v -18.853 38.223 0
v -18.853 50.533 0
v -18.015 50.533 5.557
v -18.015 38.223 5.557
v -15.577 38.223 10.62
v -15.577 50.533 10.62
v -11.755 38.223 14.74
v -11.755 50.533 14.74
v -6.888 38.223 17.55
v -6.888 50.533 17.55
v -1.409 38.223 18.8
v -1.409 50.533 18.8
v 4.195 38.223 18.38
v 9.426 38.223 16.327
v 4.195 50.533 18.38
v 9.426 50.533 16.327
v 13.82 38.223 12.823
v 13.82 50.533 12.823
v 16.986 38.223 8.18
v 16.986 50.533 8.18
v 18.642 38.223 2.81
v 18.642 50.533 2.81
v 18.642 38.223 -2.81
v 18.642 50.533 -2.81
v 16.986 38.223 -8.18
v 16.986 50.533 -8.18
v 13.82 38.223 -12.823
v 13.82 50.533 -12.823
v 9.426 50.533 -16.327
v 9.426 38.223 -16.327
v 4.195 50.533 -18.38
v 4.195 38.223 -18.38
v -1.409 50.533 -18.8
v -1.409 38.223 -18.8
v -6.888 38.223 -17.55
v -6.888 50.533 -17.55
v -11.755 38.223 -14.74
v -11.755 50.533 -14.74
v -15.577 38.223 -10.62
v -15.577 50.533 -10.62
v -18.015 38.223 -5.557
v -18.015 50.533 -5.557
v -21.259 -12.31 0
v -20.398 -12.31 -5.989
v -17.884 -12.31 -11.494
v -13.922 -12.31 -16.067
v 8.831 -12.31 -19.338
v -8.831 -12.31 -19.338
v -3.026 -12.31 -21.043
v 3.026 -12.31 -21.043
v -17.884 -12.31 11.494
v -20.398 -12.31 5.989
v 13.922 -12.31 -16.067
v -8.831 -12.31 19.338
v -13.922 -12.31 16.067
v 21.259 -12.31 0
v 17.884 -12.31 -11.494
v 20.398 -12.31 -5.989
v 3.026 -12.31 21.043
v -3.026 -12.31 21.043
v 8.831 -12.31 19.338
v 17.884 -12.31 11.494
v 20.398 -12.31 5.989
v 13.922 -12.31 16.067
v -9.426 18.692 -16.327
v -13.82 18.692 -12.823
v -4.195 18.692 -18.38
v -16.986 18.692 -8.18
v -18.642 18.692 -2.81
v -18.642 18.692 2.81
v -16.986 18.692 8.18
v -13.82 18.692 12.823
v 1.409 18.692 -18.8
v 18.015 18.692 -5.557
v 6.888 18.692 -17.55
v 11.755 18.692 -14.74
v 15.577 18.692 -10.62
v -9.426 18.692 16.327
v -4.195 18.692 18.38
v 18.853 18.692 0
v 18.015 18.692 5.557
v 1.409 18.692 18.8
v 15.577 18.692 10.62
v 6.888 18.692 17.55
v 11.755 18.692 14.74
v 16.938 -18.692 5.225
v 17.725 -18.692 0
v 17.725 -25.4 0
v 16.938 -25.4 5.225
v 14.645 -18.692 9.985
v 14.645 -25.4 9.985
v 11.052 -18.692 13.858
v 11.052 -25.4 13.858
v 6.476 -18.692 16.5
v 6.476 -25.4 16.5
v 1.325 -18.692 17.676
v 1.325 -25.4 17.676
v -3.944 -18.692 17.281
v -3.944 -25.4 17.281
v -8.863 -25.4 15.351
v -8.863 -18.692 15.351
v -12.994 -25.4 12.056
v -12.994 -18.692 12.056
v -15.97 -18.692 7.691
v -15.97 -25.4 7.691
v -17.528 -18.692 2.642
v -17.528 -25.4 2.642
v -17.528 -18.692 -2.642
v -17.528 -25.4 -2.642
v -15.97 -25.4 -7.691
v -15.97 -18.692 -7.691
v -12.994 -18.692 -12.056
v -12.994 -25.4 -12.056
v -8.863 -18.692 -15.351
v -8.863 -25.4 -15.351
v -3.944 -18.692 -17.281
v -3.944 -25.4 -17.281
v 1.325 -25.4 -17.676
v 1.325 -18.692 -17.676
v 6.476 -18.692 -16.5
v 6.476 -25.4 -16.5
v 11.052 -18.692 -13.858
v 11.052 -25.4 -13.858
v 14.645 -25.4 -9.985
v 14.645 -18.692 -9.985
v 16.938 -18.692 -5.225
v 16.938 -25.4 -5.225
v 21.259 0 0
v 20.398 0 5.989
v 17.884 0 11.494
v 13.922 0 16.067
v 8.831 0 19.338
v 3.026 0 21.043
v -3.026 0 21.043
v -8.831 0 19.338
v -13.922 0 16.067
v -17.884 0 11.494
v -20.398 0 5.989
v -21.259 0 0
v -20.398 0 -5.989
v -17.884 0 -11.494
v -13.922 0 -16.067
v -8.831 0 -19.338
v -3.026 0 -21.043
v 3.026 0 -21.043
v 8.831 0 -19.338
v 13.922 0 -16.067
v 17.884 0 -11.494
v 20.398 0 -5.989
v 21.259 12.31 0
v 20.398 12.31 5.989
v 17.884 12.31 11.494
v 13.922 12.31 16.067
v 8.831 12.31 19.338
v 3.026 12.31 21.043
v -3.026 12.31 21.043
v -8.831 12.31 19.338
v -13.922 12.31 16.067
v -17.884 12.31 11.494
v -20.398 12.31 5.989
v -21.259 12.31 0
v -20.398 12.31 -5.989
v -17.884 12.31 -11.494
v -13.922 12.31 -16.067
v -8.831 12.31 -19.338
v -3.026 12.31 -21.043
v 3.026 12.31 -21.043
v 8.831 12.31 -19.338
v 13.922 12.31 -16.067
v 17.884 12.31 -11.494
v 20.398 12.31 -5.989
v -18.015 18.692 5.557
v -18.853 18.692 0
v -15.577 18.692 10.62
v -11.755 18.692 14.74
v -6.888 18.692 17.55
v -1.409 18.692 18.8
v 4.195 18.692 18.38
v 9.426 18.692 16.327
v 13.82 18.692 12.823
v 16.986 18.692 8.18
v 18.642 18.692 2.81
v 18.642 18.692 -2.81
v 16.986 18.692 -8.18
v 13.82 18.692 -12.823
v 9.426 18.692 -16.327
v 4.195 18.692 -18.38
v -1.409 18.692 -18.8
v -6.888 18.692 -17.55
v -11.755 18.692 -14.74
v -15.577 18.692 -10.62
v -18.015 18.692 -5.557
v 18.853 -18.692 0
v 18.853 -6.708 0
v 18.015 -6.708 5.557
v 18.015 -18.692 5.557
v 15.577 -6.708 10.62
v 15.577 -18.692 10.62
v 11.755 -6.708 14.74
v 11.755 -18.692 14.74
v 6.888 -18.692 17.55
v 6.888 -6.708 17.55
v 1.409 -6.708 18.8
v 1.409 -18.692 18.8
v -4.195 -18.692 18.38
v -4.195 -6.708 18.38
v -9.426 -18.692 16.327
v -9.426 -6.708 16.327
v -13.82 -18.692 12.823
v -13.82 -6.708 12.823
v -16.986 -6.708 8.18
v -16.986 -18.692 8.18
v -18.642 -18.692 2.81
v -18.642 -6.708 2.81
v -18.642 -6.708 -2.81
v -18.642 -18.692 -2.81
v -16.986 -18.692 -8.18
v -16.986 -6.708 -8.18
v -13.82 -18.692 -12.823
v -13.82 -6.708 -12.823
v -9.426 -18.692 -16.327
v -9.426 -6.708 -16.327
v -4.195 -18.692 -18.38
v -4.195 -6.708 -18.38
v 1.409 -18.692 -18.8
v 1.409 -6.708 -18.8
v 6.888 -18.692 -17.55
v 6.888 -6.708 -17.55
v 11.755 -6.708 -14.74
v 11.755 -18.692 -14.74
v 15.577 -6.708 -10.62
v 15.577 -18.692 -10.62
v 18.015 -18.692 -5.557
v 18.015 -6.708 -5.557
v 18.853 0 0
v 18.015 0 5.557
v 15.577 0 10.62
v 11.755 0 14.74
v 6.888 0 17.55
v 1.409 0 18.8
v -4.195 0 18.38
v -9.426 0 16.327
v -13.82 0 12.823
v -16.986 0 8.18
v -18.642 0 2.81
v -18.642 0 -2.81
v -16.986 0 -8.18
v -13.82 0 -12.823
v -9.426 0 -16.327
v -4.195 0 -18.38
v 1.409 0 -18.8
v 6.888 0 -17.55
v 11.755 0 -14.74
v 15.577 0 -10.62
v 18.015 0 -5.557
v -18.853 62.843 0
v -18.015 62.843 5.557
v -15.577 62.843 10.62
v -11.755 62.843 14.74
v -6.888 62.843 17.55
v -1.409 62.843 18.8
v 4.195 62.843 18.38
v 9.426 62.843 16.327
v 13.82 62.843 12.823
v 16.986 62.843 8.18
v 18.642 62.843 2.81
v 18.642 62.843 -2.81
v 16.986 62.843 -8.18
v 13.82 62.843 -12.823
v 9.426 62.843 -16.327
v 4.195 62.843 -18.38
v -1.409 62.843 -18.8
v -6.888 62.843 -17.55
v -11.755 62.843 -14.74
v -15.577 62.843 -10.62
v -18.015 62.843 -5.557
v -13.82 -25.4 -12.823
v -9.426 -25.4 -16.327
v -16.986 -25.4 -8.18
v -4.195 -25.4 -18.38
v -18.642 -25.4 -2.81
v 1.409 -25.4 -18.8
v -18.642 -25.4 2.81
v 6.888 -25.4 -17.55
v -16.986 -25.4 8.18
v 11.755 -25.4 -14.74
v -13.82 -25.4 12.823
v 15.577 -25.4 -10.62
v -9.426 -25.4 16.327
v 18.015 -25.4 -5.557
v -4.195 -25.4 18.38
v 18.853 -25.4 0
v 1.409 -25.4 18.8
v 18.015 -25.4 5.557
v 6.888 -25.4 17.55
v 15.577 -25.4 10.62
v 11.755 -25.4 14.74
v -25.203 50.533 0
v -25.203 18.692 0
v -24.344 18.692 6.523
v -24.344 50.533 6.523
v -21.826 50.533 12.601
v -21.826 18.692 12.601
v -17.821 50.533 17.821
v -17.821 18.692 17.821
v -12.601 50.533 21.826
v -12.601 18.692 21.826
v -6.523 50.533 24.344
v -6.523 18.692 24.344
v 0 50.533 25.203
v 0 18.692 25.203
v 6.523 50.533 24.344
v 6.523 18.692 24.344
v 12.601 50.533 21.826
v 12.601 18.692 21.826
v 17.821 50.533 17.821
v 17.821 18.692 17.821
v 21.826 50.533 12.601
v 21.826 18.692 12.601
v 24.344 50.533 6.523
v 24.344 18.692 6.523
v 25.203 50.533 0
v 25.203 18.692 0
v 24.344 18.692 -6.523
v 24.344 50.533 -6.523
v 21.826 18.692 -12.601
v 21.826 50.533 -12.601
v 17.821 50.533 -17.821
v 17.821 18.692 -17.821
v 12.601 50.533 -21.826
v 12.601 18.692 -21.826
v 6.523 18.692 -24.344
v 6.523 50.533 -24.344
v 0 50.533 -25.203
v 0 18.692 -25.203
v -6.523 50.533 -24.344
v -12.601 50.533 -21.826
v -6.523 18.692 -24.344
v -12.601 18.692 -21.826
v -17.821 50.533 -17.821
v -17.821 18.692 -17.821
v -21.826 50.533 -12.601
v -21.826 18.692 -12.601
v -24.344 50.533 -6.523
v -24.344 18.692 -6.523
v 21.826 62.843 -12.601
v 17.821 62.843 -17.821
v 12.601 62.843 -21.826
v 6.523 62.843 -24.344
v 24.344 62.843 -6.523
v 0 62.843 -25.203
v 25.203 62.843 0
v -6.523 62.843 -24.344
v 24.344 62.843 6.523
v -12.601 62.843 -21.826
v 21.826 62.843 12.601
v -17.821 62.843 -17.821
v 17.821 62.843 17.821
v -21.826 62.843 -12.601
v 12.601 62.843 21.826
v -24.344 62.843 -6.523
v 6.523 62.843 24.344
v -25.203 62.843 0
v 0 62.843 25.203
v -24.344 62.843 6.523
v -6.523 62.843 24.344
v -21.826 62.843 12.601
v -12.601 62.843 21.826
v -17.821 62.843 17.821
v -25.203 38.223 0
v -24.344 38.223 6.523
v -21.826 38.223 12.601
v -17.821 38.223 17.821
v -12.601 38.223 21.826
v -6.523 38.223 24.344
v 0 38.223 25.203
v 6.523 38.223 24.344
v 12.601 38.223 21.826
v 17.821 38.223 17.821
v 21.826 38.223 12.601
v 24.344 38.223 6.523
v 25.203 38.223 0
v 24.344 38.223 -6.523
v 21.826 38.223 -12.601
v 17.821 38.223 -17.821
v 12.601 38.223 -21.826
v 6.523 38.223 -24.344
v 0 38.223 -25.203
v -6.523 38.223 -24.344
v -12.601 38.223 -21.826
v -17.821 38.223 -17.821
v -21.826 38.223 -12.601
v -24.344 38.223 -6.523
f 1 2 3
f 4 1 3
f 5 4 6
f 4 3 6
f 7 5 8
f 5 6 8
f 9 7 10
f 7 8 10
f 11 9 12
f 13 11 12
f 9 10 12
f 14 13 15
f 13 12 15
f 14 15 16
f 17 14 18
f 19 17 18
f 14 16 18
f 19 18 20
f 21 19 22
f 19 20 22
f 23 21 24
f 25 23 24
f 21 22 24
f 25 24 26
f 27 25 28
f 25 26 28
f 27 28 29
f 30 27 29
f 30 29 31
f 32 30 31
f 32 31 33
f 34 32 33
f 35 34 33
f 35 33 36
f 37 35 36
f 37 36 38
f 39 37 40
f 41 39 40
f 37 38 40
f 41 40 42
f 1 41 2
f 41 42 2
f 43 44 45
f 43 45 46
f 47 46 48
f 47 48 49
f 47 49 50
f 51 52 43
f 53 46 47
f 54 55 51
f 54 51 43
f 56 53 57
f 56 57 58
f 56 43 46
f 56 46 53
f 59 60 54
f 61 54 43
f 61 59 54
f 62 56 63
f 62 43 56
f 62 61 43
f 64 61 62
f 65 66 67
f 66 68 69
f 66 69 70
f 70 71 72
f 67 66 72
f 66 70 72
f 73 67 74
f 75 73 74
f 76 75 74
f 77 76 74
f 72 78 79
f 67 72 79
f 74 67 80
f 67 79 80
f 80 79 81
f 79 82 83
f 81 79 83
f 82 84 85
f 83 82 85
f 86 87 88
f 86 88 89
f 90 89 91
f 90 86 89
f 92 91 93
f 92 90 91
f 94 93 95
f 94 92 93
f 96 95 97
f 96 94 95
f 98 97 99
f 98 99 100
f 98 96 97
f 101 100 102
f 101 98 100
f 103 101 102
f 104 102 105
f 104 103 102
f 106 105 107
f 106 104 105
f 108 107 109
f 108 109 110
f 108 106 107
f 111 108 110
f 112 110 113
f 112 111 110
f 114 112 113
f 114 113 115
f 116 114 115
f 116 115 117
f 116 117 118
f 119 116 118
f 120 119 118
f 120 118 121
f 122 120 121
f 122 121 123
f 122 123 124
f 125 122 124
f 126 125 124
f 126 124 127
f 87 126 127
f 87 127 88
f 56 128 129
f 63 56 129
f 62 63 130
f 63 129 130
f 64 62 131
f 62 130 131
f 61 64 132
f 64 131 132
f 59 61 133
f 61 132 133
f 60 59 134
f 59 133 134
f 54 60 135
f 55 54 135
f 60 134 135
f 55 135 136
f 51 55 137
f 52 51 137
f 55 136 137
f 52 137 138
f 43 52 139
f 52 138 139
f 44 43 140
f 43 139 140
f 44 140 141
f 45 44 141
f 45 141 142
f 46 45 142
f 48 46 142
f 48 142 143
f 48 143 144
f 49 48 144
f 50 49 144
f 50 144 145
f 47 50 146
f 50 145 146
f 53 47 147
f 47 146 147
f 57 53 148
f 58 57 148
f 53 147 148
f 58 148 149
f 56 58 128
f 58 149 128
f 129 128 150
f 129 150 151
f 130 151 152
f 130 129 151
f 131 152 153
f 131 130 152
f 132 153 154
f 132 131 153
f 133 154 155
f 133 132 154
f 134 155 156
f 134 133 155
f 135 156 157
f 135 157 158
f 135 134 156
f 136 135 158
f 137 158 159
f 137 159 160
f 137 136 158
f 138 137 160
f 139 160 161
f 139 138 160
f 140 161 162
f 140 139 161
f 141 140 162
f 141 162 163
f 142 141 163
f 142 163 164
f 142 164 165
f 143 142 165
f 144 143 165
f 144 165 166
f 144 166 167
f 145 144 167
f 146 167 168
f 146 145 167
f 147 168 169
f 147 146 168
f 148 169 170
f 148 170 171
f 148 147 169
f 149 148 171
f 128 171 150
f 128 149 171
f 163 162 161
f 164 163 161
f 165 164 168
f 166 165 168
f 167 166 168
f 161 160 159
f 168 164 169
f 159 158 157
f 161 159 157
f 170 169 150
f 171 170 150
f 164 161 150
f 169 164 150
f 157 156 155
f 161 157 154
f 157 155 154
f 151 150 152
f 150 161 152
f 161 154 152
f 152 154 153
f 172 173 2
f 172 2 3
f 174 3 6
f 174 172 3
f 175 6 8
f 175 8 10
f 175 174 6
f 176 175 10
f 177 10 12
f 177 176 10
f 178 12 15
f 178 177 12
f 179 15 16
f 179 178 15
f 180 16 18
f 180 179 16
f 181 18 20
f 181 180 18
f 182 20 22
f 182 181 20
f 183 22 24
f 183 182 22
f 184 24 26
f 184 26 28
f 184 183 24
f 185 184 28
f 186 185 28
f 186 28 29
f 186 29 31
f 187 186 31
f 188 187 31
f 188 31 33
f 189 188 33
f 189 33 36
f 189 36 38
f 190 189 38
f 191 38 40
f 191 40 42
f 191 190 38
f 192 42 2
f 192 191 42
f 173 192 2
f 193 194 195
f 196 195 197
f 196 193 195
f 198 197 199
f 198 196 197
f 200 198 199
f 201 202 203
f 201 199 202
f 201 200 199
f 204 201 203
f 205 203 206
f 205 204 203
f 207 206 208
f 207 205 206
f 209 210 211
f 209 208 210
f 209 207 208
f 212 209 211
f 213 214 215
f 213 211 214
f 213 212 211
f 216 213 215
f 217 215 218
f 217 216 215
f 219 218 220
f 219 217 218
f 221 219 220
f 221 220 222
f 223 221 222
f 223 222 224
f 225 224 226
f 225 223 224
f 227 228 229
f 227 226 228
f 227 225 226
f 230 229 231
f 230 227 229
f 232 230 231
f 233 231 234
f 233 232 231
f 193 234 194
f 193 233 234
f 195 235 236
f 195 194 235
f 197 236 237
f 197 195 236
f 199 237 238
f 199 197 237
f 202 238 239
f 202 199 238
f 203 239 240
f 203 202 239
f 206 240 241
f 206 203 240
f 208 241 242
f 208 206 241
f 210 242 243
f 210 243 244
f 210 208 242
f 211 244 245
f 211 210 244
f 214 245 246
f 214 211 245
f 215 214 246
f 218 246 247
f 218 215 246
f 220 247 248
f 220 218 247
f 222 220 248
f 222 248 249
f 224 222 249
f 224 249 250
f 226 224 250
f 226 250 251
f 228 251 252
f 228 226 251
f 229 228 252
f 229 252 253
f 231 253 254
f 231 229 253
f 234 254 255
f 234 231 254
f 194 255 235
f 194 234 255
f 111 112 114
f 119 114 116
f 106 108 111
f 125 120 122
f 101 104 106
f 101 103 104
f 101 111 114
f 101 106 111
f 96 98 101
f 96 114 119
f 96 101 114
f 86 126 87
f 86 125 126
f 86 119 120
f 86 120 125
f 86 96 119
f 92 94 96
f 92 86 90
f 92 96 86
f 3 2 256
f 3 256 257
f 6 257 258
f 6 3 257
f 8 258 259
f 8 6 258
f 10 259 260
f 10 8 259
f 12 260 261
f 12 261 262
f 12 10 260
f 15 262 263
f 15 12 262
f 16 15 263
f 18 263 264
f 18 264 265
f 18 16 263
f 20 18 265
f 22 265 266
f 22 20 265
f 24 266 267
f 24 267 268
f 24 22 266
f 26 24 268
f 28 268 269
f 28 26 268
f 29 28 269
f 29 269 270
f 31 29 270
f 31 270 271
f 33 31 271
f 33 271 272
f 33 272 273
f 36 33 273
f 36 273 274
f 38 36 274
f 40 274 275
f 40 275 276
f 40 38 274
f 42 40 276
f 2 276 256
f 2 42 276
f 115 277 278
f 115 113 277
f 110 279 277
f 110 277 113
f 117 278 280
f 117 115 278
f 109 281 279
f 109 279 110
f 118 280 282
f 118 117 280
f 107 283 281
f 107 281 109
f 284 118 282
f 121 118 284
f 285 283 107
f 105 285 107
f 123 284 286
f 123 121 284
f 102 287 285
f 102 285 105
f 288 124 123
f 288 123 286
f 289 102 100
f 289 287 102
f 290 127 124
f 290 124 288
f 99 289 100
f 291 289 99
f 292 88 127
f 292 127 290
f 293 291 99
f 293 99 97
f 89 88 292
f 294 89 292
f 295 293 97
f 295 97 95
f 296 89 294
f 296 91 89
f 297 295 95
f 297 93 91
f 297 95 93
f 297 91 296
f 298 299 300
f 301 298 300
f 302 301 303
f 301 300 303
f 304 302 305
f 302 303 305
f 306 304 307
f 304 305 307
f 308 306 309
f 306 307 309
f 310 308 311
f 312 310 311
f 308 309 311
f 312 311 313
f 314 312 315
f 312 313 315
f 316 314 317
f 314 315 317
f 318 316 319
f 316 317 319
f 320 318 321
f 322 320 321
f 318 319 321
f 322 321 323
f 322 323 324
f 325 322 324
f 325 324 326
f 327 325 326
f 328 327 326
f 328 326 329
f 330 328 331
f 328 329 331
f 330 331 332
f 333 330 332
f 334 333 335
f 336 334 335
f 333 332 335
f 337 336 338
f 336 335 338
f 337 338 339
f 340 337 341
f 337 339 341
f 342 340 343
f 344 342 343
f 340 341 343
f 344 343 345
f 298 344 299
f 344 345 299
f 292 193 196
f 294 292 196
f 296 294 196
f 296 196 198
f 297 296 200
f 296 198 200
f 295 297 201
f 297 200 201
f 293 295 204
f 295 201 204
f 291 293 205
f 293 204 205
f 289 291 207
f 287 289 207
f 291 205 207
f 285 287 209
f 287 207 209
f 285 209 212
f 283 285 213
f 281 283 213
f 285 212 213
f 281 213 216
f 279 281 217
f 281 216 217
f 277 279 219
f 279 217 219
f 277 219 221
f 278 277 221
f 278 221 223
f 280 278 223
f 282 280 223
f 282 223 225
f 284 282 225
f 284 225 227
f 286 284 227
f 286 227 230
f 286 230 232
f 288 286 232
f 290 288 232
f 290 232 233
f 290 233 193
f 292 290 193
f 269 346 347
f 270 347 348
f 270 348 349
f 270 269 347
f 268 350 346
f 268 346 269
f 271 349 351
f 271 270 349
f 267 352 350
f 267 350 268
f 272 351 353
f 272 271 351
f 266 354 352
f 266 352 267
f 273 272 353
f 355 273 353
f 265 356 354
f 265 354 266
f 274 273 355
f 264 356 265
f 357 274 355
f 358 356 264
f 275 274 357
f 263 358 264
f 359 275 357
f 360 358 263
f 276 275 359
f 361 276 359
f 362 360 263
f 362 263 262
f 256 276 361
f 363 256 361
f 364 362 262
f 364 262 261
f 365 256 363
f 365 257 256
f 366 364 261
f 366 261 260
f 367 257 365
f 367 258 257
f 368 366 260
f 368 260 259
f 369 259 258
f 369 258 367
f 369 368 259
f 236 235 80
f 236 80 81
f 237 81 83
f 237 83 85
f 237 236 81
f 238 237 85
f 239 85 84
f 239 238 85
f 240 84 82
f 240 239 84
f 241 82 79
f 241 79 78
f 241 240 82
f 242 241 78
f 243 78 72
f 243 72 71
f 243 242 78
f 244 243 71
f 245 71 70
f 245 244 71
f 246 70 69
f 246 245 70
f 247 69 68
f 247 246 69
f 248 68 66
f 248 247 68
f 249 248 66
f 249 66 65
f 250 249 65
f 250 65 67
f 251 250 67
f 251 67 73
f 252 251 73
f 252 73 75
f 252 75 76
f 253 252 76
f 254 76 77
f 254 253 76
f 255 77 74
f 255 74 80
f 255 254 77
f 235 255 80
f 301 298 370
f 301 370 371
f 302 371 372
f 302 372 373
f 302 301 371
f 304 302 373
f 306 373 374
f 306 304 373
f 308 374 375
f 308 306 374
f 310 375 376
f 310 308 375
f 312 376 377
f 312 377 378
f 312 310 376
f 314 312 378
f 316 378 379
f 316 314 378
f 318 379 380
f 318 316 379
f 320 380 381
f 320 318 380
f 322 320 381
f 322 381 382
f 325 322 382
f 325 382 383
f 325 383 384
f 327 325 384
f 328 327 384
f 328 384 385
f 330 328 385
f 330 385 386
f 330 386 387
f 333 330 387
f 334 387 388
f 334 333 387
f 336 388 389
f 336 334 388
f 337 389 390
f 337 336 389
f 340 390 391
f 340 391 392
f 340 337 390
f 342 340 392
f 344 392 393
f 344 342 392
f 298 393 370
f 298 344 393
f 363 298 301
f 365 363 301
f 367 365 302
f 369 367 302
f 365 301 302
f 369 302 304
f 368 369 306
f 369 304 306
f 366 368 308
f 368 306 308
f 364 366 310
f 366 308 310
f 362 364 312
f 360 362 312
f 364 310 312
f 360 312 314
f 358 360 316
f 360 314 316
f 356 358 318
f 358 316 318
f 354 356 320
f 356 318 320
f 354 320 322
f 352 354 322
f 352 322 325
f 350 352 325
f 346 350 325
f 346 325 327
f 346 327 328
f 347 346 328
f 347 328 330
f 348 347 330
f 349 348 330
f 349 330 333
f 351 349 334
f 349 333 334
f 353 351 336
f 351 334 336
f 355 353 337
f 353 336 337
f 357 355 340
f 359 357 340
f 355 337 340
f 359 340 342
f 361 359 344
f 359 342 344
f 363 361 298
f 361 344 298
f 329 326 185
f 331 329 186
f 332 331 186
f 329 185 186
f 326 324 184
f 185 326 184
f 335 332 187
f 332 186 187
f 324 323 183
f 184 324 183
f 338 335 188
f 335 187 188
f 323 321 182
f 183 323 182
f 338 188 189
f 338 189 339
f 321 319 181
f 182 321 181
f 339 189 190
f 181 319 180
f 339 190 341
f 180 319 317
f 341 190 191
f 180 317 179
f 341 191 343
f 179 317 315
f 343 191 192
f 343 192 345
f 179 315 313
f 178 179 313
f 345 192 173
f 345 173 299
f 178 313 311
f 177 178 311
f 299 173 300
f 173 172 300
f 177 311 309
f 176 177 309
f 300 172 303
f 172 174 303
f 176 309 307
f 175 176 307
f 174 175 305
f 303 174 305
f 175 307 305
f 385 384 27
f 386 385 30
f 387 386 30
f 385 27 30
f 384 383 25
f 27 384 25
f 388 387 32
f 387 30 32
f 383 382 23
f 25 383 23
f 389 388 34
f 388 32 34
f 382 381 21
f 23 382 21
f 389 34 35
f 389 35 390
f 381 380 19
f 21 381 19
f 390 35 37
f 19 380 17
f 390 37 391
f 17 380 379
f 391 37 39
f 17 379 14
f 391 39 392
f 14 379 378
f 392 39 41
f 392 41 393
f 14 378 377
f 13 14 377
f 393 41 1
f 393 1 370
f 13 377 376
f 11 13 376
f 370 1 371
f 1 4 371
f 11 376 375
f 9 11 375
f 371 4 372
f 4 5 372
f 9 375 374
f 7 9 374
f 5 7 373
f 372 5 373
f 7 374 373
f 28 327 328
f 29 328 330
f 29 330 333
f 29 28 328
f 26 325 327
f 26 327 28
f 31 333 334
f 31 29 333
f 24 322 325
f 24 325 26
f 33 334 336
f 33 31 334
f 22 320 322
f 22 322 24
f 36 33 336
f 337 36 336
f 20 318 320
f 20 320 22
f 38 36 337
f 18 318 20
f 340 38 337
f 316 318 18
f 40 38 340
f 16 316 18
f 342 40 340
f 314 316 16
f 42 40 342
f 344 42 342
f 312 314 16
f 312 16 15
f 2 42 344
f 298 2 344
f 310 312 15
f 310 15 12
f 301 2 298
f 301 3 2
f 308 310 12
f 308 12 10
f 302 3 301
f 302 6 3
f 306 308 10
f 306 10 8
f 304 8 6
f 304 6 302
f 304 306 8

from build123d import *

# Parameters (mm, degrees)
F0_R        = 18.852906591
F0_R_2      = 17.7254963778
F1_DEPTH    = 18.69227
F1_FACE_R   = 18.852906591
F2_DEPTH    = 25.4
F3_R        = 25.202906591
F3_R_2      = 18.852906591
F4_DEPTH    = 31.84098
F5_R        = 21.2592466673
F4_FACE_R   = 25.202906591
F4_FACE_R_2 = 18.852906591
F6_DEPTH    = 12.31011


with BuildPart() as f1:
    # F0 (on Front) → F1 (new body, symmetric)
    with BuildSketch(Plane.XZ):
        Circle(F0_R)
        Circle(F0_R_2, mode=Mode.SUBTRACT)
        Circle(F0_R_2)
    extrude(amount=F1_DEPTH, both=True)

    # F0 (on Front) + F1_face (on face) → F2 (join)
    with BuildSketch(Plane.XZ):
        Circle(F0_R)
        Circle(F0_R_2, mode=Mode.SUBTRACT)
    with BuildSketch(Plane(origin=(0, 18.69227, 0), x_dir=(1, 0, 0), z_dir=(0, 1, 0))):
        Circle(F1_FACE_R)
    extrude(amount=F2_DEPTH, dir=(0, -1, 0))


with BuildPart() as f4:
    # F3 (on face) → F4 (new body)
    with BuildSketch(Plane(origin=(0, 18.69227, 0), x_dir=(-1, 0, 0), z_dir=(0, 1, 0))):
        Circle(F3_R)
        Circle(F3_R_2, mode=Mode.SUBTRACT)
    extrude(amount=F4_DEPTH)


with BuildPart() as f6:
    # F5 (on Front) + F4_face (on face) → F6 (new body, symmetric)
    with BuildSketch(Plane.XZ):
        Circle(F5_R)
    with BuildSketch(Plane(origin=(0, 50.53325, 0), x_dir=(-1, 0, 0), z_dir=(0, 1, 0))):
        Circle(F4_FACE_R)
        Circle(F4_FACE_R_2, mode=Mode.SUBTRACT)
    extrude(amount=F6_DEPTH, both=True, dir=(0, -1, 0))


solid = Compound([f1.part, f4.part, f6.part])
